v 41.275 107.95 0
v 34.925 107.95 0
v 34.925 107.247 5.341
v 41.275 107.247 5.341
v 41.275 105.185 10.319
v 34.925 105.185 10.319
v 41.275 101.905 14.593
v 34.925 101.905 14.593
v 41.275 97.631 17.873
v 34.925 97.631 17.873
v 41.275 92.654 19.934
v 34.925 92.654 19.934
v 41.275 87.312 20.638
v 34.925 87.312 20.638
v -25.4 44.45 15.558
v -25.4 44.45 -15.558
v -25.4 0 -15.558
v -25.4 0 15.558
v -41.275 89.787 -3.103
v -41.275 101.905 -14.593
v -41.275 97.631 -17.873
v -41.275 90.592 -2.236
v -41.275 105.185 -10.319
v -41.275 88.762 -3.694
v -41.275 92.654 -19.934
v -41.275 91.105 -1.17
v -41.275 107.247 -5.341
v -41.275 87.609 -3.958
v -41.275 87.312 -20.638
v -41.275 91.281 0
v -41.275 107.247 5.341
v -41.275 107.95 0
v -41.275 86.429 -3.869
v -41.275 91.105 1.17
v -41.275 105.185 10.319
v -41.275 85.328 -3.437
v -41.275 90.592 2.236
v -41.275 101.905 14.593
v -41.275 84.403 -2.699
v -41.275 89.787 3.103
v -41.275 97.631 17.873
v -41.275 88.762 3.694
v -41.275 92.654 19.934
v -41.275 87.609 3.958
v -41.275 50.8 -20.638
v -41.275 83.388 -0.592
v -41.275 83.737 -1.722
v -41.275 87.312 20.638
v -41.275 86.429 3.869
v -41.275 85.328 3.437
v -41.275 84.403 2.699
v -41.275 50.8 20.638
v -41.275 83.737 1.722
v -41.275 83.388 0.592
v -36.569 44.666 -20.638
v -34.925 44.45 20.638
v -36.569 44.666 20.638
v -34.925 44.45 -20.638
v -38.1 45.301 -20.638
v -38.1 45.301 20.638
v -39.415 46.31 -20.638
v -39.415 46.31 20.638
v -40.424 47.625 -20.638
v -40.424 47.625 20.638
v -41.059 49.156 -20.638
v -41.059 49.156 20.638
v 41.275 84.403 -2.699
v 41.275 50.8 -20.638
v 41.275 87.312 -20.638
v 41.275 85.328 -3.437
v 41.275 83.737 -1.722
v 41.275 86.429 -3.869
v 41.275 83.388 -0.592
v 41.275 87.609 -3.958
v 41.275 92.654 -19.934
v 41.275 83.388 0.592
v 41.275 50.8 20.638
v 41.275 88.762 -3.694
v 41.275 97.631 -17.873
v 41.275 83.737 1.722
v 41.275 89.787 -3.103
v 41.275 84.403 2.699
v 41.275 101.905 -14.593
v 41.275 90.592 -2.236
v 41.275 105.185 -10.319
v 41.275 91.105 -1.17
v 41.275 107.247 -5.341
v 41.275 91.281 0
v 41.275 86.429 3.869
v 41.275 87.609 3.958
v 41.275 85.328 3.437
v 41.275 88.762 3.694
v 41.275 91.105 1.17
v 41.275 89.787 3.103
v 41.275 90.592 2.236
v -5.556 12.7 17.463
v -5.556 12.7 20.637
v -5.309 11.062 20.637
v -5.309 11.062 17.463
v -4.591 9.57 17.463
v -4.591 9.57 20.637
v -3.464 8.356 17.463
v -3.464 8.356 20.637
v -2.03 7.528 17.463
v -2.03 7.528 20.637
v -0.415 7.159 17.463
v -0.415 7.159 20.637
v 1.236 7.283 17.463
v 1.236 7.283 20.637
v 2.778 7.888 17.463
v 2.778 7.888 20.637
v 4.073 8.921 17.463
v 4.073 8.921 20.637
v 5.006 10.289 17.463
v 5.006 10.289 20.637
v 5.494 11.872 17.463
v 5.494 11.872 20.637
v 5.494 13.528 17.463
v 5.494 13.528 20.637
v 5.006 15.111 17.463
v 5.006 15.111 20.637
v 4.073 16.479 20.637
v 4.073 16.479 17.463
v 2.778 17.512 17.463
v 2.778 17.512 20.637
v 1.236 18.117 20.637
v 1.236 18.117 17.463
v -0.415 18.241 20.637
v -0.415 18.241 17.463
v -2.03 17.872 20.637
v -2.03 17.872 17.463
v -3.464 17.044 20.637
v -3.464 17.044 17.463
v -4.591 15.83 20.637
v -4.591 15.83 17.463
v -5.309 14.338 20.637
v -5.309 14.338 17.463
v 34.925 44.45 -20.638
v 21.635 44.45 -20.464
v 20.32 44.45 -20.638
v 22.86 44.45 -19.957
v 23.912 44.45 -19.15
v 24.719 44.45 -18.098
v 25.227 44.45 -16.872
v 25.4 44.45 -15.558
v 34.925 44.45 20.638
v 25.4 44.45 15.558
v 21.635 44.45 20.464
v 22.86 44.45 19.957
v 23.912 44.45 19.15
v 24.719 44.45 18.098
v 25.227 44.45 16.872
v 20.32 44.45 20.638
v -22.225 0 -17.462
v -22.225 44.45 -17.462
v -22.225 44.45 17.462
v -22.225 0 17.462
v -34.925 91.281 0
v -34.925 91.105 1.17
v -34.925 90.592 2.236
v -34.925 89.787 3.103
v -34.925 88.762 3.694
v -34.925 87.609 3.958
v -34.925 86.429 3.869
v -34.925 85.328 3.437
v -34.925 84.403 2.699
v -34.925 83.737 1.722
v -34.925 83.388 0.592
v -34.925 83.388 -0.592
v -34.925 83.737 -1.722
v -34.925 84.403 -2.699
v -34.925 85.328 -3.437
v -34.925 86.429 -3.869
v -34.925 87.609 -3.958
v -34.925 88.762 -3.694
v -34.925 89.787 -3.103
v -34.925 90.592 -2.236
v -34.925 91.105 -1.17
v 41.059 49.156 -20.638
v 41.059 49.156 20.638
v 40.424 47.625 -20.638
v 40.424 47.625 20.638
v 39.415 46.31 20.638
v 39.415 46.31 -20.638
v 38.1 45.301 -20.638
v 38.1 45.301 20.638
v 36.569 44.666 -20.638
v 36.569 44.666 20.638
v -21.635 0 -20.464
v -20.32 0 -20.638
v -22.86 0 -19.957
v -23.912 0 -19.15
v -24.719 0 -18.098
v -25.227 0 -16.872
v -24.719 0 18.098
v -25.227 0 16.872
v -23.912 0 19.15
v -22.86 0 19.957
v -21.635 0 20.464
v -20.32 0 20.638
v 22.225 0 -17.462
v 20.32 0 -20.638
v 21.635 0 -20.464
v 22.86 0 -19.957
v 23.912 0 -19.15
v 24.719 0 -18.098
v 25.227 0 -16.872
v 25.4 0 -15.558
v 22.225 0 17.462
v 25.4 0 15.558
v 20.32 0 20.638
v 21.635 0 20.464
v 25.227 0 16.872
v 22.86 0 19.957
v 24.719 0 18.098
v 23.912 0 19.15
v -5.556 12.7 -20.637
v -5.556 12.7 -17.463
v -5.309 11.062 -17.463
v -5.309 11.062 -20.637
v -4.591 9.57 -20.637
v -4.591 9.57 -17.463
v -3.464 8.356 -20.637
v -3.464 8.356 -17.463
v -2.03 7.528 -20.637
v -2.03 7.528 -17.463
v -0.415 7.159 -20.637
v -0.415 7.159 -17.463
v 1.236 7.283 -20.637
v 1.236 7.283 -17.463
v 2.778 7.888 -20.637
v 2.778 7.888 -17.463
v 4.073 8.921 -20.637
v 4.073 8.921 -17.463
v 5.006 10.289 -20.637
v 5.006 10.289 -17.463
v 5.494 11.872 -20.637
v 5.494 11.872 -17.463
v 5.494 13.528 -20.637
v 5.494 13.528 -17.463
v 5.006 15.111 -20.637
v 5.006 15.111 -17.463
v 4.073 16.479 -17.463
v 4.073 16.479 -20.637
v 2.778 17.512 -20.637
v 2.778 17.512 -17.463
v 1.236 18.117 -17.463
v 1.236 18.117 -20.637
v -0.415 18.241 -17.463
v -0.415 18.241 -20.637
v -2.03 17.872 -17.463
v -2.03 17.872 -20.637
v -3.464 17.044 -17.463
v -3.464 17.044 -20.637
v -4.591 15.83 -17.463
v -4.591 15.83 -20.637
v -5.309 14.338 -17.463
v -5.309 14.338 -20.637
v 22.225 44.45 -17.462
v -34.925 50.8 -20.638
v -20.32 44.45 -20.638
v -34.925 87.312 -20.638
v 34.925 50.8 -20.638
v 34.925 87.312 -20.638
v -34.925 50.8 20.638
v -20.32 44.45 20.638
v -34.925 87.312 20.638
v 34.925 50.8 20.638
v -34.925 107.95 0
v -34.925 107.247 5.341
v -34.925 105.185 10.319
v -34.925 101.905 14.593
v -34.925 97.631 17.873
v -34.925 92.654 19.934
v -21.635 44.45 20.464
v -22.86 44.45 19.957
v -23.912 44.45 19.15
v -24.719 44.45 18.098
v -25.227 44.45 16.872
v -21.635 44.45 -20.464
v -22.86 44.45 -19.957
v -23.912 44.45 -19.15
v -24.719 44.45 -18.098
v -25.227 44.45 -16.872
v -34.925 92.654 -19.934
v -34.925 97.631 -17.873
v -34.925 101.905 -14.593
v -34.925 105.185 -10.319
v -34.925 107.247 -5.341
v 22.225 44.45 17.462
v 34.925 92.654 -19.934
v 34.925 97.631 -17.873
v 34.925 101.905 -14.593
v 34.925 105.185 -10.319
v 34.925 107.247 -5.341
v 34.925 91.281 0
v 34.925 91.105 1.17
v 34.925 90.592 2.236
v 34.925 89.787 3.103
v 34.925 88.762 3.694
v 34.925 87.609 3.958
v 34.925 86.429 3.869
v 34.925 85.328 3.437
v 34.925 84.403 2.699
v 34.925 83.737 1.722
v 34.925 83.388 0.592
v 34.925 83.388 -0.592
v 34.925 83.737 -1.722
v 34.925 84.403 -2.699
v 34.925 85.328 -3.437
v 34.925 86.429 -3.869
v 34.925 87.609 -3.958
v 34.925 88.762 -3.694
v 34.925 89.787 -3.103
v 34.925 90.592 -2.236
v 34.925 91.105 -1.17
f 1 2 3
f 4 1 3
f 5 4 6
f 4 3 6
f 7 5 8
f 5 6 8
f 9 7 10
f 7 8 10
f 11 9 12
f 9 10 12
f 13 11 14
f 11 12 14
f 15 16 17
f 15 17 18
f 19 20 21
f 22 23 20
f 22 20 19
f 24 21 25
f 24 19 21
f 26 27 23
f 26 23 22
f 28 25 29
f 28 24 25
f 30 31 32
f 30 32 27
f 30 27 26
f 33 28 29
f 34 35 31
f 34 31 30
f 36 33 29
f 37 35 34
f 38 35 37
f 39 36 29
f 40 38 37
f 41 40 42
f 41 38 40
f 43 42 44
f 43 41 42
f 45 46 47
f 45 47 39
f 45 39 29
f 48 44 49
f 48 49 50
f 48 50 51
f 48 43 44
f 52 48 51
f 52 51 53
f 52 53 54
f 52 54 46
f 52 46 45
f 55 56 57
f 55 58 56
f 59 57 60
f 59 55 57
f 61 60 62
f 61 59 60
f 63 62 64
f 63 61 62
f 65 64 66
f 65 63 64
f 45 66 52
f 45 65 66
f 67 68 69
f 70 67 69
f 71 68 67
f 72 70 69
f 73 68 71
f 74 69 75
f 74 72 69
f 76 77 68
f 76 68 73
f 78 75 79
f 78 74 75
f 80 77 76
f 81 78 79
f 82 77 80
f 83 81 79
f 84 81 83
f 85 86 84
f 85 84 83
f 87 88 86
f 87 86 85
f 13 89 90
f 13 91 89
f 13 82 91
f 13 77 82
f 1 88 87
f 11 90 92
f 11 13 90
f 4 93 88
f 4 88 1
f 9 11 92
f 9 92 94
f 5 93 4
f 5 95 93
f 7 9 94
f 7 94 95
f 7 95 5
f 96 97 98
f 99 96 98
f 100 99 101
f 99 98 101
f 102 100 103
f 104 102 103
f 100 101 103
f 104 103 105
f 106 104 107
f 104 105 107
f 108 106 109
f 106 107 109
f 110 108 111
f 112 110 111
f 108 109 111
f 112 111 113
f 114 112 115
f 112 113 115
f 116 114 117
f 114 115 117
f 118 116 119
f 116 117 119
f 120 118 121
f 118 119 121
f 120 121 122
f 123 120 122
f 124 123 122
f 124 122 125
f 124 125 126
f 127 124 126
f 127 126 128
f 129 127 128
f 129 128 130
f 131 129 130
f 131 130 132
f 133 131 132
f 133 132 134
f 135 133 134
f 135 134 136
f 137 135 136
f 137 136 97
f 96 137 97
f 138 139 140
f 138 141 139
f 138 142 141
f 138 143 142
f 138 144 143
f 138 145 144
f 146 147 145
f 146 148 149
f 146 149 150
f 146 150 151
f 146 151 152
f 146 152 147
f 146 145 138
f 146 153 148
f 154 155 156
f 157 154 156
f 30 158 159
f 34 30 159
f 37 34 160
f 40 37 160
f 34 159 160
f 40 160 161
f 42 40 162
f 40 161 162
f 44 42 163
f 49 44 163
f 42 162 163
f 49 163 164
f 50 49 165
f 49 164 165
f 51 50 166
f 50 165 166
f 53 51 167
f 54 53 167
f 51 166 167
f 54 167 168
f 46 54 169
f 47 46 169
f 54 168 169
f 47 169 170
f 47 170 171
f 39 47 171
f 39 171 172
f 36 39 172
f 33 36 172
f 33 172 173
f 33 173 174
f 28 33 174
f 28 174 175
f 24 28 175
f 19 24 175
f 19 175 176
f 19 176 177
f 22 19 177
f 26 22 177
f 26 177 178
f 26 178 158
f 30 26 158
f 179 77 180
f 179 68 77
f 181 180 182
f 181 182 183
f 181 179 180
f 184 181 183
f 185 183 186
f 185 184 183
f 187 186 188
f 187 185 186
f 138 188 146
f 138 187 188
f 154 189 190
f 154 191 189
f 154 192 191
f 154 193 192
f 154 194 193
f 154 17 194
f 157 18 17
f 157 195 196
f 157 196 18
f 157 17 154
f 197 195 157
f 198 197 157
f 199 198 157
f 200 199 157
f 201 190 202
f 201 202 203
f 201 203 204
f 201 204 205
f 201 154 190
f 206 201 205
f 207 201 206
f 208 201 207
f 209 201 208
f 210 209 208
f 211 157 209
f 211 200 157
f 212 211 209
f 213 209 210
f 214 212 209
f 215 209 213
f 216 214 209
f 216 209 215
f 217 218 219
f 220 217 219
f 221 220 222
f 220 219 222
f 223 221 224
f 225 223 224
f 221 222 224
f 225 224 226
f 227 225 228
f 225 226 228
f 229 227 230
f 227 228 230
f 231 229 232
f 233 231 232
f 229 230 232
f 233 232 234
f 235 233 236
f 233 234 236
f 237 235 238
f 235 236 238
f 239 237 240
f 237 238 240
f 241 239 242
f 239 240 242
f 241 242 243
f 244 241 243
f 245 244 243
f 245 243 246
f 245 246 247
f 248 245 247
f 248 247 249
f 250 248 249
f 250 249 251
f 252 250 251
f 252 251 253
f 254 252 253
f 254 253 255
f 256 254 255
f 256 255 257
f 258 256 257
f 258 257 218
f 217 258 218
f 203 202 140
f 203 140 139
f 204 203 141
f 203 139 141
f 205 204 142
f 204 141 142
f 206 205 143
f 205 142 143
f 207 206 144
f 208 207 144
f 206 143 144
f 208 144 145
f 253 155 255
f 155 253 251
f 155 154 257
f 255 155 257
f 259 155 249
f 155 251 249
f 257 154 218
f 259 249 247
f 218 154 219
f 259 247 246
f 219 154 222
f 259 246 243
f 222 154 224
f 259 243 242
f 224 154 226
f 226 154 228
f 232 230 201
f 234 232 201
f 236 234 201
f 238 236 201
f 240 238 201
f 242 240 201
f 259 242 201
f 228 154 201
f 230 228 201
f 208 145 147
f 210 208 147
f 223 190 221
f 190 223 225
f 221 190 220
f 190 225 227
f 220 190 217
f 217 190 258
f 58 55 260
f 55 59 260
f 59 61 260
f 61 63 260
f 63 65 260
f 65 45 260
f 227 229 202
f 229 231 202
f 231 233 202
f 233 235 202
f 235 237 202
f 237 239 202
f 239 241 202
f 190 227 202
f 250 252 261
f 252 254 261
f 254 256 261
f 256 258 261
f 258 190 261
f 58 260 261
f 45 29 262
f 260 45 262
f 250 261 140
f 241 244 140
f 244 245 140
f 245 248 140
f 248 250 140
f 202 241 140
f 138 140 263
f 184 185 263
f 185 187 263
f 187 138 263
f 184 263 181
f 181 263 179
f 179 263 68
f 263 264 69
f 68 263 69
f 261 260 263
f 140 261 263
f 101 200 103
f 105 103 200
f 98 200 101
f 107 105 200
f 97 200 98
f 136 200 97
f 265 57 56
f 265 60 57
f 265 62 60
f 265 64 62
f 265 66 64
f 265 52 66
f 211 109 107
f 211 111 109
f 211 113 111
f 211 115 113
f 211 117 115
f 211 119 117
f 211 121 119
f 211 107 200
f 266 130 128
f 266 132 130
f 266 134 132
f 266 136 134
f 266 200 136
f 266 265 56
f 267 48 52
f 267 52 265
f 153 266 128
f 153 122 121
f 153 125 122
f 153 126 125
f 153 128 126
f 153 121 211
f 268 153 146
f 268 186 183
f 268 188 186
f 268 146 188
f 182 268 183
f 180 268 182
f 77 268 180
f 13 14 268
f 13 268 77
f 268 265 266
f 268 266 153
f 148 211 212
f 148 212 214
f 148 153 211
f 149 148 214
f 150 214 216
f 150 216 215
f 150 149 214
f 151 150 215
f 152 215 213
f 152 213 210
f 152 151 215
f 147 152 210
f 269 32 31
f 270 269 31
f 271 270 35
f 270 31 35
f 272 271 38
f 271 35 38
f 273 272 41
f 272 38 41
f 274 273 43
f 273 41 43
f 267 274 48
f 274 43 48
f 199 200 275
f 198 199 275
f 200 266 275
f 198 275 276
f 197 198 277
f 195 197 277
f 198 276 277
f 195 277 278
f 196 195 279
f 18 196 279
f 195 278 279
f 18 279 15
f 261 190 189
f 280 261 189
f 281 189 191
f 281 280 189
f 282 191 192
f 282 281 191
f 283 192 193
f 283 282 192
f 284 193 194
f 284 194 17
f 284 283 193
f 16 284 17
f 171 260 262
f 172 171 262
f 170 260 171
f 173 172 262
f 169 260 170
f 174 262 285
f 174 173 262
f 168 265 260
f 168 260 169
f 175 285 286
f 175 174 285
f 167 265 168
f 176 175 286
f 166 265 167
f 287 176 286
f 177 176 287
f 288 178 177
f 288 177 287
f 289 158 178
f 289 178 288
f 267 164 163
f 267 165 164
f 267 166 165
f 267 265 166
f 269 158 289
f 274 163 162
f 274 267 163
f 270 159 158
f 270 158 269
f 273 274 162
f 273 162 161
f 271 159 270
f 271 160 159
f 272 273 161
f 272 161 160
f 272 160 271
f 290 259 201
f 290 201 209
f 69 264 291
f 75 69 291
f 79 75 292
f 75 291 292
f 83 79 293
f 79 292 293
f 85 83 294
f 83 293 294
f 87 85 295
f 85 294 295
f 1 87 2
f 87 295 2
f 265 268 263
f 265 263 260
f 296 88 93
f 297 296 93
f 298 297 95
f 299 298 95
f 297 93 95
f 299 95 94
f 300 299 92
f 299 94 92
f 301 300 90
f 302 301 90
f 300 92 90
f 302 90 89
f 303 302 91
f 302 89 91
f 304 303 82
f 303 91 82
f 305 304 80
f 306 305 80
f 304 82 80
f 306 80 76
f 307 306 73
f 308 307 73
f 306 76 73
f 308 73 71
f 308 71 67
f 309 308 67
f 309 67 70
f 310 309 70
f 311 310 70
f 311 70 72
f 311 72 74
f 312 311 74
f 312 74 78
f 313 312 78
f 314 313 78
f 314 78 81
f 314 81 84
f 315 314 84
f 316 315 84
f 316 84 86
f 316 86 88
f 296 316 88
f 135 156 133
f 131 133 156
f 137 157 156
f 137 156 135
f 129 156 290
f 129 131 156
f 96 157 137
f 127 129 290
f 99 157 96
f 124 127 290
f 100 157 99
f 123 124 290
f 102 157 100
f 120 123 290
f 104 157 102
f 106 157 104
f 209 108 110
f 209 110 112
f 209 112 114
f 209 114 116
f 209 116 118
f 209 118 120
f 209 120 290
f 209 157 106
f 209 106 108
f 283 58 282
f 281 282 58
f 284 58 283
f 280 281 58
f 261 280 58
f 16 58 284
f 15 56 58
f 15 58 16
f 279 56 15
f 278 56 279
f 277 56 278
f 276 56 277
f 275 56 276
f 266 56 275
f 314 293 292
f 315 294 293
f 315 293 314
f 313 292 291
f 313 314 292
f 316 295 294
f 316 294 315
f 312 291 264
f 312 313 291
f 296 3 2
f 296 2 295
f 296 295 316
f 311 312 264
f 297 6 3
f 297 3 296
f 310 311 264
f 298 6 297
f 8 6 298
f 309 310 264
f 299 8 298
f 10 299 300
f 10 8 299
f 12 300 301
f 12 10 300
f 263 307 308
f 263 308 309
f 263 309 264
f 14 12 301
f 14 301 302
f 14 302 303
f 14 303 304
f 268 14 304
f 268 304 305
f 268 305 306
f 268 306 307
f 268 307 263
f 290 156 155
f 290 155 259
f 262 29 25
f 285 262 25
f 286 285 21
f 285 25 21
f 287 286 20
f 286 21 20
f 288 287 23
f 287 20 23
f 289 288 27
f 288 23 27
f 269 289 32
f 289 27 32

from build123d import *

# Parameters (mm, degrees)
F0_W     = 50.8
F0_H     = 41.275
F0_W_2   = 44.45
F0_H_2   = 34.925
F1_DEPTH = 44.45
F3_DEPTH = 20.6375
F5_DEPTH = 82.551
F7_D     = 7.9375
F8_R     = 6.35
F9_R     = 5.08
F11_D    = 11.1125


with BuildPart() as f1:
    # F0 (on Front) → F1 (new body)
    with BuildSketch(Plane.XZ):
        Rectangle(F0_W, F0_H)
        Rectangle(F0_W_2, F0_H_2, mode=Mode.SUBTRACT)
    extrude(amount=-F1_DEPTH)

    # F2 (on Top) → F3 (join, symmetric)
    with BuildSketch(Plane.XY):
        Polygon((41.275, 44.45), (41.275, 107.95), (34.925, 107.95), (34.925, 101.6), (34.925, 50.8), (-34.925, 50.8), (-34.925, 101.6), (-34.925, 107.95), (-41.275, 107.95), (-41.275, 44.45), align=None)
    extrude(amount=F3_DEPTH, both=True)

    # F4 (on face) → F5 (cut, through all)
    with BuildSketch(Plane(origin=(-41.275, 0, 0), x_dir=(0, -1, 0), z_dir=(-1, 0, 0))):
        with BuildLine():
            Line((-107.95, -20.6375), (-87.3125, -20.6375))
            ThreePointArc((-87.3125, -20.6375), (-101.9054161967, -14.5929161967), (-107.95, 0))
            Line((-107.95, 0), (-107.95, -20.6375))
        make_face()
        with BuildLine():
            ThreePointArc((-107.95, 0), (-101.9054161967, 14.5929161967), (-87.3125, 20.6375))
            Line((-87.3125, 20.6375), (-107.95, 20.6375))
            Line((-107.95, 20.6375), (-107.95, 0))
        make_face()
    extrude(amount=-F5_DEPTH, mode=Mode.SUBTRACT)

    # F7 (through all)
    with Locations(Plane(origin=(-41.275, 0, 0), x_dir=(0, -1, 0), z_dir=(-1, 0, 0))):
        with Locations((-87.3125, 0)):
            Hole(F7_D / 2)

    # F8
    f8_edges = [f1.edges().sort_by_distance(p)[0] for p in [
        (-41.275, 44.45, 0),
        (41.275, 44.45, 0),
    ]]
    fillet(f8_edges, radius=F8_R)

    # F9
    f9_edges = [f1.edges().sort_by_distance(p)[0] for p in [
        (-25.4, 22.225, 20.6375),
        (25.4, 22.225, 20.6375),
        (25.4, 22.225, -20.6375),
        (-25.4, 22.225, -20.6375),
    ]]
    fillet(f9_edges, radius=F9_R)

    # F11 (through all)
    with Locations(Plane(origin=(0, 0, -20.6375), x_dir=(1, 0, 0), z_dir=(0, 0, -1))):
        with Locations((0, -12.7)):
            Hole(F11_D / 2)


solid = f1.part
